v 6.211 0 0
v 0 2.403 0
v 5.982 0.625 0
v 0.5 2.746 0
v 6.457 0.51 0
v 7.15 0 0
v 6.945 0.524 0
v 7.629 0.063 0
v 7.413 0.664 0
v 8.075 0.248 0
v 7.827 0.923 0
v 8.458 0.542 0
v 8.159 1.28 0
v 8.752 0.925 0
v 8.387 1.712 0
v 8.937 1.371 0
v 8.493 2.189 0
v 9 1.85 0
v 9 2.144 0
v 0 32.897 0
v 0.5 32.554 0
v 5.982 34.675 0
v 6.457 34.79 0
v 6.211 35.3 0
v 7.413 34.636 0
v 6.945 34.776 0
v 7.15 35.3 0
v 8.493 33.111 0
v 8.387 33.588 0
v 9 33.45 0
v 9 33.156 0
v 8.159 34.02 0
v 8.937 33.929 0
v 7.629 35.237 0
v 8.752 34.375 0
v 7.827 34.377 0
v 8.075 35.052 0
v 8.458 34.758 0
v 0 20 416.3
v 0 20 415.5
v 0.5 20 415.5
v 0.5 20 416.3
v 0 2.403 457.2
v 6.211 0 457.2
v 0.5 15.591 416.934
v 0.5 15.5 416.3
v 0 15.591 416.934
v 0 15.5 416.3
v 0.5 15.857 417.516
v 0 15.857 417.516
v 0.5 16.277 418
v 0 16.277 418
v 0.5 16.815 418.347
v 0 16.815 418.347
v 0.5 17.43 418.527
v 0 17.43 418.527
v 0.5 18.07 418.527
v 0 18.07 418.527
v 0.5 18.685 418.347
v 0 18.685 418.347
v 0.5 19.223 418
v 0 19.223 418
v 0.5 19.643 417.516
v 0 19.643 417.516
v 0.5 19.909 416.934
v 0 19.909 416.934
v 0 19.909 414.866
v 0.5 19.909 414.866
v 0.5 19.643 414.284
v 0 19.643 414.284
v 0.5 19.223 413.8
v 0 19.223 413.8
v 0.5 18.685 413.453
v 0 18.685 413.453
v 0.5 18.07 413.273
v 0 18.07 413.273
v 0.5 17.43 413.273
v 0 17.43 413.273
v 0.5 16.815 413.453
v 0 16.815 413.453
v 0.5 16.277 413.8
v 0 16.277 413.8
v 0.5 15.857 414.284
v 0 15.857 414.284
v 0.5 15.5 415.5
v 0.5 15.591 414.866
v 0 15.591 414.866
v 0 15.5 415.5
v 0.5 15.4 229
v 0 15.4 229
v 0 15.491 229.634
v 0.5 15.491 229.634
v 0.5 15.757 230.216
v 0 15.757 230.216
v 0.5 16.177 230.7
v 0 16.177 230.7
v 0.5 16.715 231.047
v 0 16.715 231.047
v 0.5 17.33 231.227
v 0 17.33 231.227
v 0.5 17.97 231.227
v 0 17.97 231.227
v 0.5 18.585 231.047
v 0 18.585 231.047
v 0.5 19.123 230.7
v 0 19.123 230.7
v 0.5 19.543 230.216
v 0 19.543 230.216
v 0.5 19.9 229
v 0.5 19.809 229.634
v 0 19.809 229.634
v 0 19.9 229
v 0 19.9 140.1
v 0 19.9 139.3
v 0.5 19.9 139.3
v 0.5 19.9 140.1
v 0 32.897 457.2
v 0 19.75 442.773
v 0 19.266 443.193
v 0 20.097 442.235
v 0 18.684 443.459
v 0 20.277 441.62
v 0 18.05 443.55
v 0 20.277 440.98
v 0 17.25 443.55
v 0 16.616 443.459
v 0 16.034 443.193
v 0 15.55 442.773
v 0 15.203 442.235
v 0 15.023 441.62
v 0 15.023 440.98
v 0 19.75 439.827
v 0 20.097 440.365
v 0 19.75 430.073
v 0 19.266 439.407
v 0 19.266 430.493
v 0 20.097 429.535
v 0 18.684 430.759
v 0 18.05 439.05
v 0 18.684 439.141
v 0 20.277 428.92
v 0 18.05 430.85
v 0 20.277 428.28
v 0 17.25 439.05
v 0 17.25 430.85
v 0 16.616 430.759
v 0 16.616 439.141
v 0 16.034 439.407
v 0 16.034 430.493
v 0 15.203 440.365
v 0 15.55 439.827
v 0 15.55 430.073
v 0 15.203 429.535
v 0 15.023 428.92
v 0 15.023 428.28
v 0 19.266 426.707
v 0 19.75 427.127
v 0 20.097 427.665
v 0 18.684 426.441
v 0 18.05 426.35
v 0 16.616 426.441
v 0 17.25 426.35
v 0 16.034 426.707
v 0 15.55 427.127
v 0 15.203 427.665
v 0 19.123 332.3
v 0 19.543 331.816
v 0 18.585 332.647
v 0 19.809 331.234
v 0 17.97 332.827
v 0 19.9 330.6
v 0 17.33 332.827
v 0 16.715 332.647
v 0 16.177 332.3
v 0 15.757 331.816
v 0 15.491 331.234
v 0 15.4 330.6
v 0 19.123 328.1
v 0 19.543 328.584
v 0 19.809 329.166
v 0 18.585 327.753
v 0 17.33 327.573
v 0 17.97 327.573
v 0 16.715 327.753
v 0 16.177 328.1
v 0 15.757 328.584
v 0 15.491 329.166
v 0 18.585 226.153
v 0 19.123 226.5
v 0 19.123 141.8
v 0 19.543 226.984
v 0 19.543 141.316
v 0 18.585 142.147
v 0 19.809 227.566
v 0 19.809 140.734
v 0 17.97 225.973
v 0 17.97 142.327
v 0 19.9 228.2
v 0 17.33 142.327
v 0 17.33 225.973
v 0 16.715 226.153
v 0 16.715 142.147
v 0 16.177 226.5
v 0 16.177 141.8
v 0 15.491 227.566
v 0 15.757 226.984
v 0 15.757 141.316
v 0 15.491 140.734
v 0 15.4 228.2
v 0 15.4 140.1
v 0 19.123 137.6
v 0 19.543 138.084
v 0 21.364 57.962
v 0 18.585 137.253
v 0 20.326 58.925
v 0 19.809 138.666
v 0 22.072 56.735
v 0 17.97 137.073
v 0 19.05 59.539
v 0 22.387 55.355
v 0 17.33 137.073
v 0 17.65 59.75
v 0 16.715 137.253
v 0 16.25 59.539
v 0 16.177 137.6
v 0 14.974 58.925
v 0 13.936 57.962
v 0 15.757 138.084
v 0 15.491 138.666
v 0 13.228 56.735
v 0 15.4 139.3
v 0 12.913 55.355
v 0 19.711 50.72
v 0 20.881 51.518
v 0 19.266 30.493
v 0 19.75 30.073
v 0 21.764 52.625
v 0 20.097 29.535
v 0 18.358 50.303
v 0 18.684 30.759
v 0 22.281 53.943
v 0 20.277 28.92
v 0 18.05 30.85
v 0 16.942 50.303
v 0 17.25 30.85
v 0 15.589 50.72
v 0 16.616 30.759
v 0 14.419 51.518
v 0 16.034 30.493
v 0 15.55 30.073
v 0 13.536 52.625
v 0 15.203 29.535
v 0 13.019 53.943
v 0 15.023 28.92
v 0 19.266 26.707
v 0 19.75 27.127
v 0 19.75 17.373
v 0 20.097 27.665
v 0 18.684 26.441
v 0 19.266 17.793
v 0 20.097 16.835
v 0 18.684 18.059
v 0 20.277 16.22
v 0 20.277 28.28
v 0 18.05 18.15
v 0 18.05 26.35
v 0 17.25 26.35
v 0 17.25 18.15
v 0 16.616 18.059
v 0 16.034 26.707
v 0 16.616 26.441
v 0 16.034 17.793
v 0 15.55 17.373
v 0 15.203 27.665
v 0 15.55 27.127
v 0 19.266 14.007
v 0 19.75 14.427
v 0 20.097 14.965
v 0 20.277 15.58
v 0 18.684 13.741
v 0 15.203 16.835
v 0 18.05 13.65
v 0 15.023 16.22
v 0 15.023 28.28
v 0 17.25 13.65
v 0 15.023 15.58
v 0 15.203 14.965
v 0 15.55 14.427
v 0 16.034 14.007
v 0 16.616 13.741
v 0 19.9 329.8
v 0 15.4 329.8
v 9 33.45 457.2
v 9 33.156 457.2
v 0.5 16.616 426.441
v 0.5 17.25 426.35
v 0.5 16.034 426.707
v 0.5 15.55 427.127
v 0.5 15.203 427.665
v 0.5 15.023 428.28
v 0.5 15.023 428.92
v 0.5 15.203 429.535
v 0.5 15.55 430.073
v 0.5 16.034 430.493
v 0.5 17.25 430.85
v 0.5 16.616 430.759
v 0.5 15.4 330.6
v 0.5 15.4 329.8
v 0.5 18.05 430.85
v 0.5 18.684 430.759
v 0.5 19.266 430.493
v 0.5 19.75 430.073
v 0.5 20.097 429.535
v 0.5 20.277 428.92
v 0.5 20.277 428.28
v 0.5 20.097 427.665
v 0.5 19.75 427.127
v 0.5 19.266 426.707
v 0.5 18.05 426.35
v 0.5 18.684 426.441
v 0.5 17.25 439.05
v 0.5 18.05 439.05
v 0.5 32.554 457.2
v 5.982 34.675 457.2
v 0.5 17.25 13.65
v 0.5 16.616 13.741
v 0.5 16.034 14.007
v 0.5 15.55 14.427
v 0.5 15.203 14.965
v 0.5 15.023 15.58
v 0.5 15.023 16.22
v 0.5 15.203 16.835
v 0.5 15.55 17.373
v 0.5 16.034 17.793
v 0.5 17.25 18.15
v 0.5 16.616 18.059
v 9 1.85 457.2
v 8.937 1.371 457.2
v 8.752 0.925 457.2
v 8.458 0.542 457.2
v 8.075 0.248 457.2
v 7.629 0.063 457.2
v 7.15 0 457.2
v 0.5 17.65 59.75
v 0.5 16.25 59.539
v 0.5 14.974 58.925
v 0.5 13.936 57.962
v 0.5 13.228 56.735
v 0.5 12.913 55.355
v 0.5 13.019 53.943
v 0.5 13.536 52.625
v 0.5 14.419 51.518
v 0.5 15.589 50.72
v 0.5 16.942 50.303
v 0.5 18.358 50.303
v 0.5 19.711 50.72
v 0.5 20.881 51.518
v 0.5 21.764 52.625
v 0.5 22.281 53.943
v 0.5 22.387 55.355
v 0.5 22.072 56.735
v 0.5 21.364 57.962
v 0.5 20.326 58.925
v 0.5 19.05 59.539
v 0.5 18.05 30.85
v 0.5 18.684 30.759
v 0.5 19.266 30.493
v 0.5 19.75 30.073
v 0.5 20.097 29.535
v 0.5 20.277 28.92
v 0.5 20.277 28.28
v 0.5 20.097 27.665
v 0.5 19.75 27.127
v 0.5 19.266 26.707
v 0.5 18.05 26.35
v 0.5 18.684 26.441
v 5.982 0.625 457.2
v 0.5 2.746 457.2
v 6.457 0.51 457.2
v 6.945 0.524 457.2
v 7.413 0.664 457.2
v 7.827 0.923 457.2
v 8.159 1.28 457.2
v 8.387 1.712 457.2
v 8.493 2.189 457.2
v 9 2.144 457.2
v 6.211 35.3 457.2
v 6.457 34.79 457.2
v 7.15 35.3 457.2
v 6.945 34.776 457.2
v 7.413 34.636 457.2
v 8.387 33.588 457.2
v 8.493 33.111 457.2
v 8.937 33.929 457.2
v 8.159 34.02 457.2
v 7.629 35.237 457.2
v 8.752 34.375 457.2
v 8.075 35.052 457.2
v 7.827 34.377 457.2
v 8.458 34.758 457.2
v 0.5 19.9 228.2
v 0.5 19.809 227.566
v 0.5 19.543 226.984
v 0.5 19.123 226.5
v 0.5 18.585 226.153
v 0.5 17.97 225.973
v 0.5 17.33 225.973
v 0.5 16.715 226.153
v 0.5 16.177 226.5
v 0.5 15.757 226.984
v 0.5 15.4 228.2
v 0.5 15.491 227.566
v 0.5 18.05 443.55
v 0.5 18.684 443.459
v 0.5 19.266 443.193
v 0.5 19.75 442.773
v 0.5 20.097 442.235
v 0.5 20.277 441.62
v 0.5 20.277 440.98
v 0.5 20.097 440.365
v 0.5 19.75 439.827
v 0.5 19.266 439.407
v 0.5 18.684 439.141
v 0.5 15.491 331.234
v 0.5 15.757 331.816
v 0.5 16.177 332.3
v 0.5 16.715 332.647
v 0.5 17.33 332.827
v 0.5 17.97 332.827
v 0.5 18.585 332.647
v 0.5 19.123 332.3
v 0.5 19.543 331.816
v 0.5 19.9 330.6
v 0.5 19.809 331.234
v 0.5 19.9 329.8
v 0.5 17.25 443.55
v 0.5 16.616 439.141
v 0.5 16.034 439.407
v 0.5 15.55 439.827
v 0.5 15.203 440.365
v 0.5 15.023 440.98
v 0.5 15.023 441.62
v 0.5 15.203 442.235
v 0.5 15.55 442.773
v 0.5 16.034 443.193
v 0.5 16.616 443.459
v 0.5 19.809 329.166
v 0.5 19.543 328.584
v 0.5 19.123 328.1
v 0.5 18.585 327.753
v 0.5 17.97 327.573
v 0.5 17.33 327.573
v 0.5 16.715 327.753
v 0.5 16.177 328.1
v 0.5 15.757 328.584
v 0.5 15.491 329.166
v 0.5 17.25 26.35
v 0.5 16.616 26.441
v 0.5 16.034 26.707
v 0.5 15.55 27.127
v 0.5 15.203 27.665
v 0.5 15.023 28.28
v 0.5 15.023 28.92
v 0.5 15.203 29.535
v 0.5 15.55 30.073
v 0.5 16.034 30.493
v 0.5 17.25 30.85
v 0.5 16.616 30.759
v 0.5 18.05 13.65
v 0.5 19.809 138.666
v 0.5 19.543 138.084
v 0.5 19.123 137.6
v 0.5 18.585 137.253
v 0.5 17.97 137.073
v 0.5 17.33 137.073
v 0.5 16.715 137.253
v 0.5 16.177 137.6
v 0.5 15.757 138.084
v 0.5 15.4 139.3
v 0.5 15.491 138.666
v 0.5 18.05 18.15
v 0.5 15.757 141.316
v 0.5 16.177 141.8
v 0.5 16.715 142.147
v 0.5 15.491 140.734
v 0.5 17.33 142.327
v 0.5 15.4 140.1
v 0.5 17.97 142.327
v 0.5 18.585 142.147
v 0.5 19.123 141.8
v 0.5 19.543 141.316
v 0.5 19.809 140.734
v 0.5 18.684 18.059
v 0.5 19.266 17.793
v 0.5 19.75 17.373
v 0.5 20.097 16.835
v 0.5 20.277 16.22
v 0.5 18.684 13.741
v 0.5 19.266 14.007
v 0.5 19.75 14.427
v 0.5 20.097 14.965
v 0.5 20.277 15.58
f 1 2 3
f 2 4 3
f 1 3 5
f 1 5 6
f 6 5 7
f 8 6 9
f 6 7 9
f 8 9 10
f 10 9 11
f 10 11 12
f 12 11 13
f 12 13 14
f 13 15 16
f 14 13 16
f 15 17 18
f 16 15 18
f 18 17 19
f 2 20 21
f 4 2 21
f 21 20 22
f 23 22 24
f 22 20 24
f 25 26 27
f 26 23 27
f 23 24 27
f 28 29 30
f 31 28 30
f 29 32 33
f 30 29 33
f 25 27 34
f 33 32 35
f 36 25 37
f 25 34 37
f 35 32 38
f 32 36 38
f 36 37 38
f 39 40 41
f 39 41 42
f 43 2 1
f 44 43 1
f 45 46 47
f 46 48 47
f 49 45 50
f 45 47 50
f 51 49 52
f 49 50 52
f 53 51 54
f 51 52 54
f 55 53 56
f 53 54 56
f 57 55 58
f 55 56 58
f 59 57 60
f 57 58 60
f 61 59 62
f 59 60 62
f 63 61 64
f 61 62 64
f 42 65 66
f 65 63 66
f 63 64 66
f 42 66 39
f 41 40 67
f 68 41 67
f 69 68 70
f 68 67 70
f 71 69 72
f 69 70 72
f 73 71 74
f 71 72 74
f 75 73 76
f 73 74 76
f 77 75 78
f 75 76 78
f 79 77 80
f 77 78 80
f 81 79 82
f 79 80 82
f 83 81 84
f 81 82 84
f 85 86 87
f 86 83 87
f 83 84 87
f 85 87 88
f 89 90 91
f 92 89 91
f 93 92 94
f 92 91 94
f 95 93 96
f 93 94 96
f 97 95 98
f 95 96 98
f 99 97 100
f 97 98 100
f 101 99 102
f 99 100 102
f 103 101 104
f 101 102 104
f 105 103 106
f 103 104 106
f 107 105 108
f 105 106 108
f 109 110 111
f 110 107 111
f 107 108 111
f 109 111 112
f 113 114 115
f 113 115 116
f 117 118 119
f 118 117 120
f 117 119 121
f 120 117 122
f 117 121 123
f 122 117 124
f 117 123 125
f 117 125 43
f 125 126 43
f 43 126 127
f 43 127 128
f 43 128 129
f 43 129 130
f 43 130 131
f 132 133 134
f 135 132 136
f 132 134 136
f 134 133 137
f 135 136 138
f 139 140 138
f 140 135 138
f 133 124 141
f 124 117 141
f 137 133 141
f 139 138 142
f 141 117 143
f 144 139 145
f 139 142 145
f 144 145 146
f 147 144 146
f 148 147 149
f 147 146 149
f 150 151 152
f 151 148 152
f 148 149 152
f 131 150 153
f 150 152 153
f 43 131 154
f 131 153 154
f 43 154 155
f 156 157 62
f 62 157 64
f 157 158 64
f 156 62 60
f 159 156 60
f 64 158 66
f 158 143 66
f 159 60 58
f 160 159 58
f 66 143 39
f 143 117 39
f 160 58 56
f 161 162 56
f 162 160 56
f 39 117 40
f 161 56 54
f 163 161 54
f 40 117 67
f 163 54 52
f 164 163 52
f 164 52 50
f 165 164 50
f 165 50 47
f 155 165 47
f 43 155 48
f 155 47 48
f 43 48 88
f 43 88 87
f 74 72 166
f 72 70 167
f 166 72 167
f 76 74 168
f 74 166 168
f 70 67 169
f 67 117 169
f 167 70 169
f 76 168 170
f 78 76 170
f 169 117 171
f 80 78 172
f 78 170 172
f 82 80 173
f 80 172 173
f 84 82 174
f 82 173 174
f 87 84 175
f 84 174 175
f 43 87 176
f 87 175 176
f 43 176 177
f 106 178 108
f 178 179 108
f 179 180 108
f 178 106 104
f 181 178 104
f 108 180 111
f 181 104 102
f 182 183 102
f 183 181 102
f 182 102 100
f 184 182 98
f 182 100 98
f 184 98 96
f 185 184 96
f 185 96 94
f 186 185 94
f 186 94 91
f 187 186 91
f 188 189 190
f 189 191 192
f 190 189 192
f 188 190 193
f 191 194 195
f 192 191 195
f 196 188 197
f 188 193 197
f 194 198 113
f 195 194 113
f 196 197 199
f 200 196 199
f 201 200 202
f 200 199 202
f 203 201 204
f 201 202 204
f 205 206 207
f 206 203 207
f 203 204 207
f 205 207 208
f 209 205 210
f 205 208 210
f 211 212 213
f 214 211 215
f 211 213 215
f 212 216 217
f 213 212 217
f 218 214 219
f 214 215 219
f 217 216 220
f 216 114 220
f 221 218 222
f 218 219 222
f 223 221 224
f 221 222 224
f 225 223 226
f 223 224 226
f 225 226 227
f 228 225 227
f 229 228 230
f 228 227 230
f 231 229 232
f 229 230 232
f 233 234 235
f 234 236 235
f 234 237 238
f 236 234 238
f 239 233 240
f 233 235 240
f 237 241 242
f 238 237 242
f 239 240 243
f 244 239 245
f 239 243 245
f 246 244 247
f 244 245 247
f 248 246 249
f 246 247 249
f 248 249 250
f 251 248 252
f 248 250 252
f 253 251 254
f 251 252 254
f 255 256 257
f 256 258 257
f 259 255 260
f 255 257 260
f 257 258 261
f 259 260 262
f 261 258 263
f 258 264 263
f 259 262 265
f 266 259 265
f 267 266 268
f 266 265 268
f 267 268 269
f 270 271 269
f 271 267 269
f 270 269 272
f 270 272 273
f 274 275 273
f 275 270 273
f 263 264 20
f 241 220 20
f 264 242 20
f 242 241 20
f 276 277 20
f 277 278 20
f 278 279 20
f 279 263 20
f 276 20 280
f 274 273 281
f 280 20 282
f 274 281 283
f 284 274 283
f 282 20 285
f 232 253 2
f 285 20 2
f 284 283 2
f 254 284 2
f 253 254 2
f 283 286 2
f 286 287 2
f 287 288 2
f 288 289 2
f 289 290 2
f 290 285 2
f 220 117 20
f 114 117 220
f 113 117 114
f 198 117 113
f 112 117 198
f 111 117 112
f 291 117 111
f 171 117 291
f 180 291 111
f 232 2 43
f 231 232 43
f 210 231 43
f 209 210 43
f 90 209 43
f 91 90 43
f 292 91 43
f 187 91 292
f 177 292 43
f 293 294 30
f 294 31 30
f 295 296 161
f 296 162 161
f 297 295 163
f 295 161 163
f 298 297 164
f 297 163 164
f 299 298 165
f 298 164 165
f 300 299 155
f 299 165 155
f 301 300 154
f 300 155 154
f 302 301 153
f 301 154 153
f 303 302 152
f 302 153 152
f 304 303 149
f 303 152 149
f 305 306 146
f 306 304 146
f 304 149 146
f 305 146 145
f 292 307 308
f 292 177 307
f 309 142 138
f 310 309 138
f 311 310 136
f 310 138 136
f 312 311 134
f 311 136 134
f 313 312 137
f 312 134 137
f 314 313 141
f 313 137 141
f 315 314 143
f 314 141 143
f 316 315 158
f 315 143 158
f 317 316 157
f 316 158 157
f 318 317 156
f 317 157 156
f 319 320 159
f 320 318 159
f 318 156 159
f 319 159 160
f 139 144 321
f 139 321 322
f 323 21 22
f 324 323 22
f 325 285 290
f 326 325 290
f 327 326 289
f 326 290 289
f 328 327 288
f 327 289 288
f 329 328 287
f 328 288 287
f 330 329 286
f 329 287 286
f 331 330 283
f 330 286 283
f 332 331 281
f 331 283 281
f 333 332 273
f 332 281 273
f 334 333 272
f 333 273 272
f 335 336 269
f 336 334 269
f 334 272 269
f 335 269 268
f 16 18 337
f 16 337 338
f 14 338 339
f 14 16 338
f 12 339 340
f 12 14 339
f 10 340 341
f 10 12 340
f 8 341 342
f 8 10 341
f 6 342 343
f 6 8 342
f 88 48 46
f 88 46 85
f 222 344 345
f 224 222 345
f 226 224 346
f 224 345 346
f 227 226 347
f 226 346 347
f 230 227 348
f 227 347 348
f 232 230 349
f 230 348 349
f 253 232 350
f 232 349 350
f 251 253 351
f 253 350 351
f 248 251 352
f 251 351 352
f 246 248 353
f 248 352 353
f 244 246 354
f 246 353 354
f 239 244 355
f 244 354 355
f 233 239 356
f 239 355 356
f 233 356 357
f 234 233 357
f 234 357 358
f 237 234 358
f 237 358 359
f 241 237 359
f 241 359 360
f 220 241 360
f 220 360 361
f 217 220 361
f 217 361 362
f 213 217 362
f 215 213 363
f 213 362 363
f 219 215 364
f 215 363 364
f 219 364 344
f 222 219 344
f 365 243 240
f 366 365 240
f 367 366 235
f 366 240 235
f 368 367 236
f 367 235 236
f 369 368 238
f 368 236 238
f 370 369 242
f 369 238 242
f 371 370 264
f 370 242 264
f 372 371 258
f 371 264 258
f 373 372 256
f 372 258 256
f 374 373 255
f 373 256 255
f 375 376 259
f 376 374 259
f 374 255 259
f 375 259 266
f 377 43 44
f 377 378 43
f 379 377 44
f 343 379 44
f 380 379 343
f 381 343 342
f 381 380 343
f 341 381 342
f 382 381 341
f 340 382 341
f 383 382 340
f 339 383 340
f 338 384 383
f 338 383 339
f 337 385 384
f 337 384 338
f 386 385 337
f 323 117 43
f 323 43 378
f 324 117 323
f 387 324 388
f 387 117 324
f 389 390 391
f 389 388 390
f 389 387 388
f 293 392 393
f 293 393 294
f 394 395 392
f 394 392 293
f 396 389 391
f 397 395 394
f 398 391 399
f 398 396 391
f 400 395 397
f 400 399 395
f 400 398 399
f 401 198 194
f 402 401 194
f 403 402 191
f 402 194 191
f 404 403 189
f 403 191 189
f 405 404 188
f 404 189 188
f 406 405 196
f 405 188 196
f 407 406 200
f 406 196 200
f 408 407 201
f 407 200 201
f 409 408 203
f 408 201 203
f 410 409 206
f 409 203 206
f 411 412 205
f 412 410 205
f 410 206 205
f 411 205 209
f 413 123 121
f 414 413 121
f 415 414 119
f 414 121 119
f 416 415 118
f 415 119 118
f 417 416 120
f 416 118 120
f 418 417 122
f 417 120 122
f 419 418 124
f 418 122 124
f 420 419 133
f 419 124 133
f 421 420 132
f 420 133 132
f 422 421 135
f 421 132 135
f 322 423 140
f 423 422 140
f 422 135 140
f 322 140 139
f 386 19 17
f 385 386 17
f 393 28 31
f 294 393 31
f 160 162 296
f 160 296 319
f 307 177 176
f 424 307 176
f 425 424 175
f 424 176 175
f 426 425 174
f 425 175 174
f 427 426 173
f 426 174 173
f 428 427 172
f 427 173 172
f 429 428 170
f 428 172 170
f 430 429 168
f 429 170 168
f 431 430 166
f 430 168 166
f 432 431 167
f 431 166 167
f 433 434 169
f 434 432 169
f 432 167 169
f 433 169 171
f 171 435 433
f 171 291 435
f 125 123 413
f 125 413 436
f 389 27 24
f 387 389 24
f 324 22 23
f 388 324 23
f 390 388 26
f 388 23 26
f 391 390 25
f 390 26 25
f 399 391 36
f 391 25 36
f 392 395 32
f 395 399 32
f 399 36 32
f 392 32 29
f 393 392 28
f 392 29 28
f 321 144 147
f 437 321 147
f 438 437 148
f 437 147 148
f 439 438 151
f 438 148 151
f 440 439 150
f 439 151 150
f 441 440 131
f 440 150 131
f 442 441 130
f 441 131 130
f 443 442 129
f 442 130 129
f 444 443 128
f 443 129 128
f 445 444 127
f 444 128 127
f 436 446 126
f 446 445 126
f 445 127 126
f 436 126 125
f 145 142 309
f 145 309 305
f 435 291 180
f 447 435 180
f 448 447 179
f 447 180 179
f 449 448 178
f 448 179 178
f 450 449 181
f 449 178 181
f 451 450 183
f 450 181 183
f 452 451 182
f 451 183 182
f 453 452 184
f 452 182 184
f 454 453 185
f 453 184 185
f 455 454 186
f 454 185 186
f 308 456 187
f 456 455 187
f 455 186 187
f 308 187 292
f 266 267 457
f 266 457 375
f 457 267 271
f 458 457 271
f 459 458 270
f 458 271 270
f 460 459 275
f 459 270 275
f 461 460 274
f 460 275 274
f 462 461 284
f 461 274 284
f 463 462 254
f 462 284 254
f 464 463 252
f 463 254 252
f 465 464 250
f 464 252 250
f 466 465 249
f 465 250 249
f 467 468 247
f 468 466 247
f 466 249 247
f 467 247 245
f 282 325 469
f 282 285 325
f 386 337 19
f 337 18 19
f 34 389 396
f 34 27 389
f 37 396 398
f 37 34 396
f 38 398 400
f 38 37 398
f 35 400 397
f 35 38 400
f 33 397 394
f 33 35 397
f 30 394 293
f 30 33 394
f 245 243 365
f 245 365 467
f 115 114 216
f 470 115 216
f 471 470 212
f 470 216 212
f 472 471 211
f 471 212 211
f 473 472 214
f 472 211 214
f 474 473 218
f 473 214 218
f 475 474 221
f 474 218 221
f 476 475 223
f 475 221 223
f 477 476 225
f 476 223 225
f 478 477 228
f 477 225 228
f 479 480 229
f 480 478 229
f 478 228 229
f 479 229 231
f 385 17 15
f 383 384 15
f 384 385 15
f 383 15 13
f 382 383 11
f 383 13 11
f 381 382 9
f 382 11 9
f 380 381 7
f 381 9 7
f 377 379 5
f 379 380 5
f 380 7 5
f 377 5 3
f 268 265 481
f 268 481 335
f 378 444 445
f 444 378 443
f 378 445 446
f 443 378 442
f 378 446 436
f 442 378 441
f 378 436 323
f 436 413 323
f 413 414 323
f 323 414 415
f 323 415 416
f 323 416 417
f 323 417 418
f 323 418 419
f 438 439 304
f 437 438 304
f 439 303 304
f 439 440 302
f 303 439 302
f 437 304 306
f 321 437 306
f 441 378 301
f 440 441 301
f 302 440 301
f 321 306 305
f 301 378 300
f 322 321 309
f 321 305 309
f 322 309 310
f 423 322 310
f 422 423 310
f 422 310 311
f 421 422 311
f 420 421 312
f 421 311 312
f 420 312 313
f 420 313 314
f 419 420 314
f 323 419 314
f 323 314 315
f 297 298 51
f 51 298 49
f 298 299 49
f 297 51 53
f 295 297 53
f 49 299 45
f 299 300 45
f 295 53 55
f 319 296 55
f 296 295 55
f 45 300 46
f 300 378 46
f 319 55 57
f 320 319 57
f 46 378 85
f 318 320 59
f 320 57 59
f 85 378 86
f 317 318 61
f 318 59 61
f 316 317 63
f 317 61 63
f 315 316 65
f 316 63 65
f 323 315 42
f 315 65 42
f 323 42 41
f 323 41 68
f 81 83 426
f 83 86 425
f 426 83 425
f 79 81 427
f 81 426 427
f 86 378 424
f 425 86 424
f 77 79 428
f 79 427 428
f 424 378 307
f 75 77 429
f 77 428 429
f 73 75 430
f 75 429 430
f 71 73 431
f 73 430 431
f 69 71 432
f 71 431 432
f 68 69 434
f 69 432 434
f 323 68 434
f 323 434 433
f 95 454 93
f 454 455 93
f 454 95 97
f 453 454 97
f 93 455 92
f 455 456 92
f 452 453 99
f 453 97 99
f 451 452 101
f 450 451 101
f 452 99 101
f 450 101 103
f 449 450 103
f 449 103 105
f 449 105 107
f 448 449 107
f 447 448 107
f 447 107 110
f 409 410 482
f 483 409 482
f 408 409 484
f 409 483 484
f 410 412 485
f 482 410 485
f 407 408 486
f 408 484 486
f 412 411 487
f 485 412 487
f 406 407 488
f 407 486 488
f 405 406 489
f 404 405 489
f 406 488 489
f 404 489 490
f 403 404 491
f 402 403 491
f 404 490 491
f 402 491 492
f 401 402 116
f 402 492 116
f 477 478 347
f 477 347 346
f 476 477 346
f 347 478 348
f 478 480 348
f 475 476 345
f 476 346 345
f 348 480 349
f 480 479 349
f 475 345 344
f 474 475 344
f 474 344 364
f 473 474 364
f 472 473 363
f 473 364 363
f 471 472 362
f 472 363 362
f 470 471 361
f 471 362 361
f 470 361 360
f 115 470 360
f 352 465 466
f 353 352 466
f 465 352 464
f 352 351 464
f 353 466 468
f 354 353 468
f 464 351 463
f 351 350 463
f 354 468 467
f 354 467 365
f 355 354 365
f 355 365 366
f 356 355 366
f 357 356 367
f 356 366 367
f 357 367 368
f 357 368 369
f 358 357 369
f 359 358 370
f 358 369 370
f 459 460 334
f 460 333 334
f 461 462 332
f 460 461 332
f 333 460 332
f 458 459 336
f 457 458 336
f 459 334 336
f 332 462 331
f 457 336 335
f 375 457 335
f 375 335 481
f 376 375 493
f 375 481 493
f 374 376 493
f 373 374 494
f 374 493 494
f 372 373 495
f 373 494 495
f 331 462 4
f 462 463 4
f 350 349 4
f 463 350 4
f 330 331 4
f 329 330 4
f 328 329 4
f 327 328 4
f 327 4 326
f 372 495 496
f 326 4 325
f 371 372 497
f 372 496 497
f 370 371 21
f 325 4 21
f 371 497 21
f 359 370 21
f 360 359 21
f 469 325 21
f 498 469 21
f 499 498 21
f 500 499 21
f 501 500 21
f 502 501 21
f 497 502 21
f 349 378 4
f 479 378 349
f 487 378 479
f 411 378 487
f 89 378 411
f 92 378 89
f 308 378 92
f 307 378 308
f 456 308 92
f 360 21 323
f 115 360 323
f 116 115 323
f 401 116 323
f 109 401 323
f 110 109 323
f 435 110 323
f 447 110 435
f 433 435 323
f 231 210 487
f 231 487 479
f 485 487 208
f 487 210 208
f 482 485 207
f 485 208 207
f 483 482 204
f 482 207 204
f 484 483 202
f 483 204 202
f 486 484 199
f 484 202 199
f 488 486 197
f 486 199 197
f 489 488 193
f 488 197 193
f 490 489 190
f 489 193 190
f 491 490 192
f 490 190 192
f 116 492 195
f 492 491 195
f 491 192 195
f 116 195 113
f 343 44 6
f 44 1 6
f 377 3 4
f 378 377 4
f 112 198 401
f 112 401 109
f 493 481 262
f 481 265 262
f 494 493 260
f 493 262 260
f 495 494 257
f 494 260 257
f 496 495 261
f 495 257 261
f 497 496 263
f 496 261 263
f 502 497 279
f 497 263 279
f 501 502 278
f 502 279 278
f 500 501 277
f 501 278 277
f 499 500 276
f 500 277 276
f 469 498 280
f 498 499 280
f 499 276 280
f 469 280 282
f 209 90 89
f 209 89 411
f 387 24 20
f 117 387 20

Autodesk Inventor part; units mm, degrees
sketch "Sketch_1" plane through (0, 0, 0) normal (0, 0, 1) x (1, 0, 0)
  line L0 (0, 32.8967) -> (0, 2.4033)
  line L1 (0, 2.4033) -> (6.2112, 0)
  line L2 (6.2112, 0) -> (7.15, 0)
  arc A0 (7.15, 0) -> (9, 1.85) centre (7.15, 1.85) ccw
  line L3 (9, 1.85) -> (9, 2.1444)
  line L4 (9, 2.1444) -> (8.493, 2.1888)
  arc A1 (5.9824, 0.6246) -> (8.493, 2.1888) centre (6.65, 2.35) ccw
  line L5 (5.9824, 0.6246) -> (0.5, 2.7459)
  line L6 (0.5, 2.7459) -> (0.5, 32.5541)
  line L7 (0.5, 32.5541) -> (5.9824, 34.6754)
  arc A2 (8.493, 33.1112) -> (5.9824, 34.6754) centre (6.65, 32.95) ccw
  line L8 (8.493, 33.1112) -> (9, 33.1556)
  line L9 (9, 33.1556) -> (9, 33.45)
  arc A3 (9, 33.45) -> (7.15, 35.3) centre (7.15, 33.45) ccw
  line L10 (7.15, 35.3) -> (6.2112, 35.3)
  line L11 (6.2112, 35.3) -> (0, 32.8967)
extrude "Extrusion1" add sketch "Sketch_1" along normal blind 457.2
sketch "Sketch_4" plane through (0, 0, 0) normal (1, 0, 0) x (0, 1, 0)
  arc A0 (17.65, 332.85) -> (15.4, 330.6) centre (17.65, 330.6) ccw
  line L0 (15.4, 330.6) -> (15.4, 329.8)
  arc A1 (15.4, 329.8) -> (17.65, 327.55) centre (17.65, 329.8) ccw
  arc A2 (17.65, 327.55) -> (19.9, 329.8) centre (17.65, 329.8) ccw
  line L1 (19.9, 329.8) -> (19.9, 330.6)
  arc A3 (19.9, 330.6) -> (17.65, 332.85) centre (17.65, 330.6) ccw
extrude "Extrusion2" cut sketch "Sketch_4" along normal blind 0.5
sketch "Sketch_5" plane through (0, 0, 0) normal (1, 0, 0) x (0, 1, 0)
  arc A0 (17.65, 231.25) -> (15.4, 229) centre (17.65, 229) ccw
  line L0 (15.4, 229) -> (15.4, 228.2)
  arc A1 (15.4, 228.2) -> (17.65, 225.95) centre (17.65, 228.2) ccw
  arc A2 (17.65, 225.95) -> (19.9, 228.2) centre (17.65, 228.2) ccw
  line L1 (19.9, 228.2) -> (19.9, 229)
  arc A3 (19.9, 229) -> (17.65, 231.25) centre (17.65, 229) ccw
extrude "Extrusion3" cut sketch "Sketch_5" along normal blind 0.5
sketch "Sketch_6" plane through (0, 0, 0) normal (1, 0, 0) x (0, 1, 0)
  arc A0 (17.65, 142.35) -> (15.4, 140.1) centre (17.65, 140.1) ccw
  line L0 (15.4, 140.1) -> (15.4, 139.3)
  arc A1 (15.4, 139.3) -> (17.65, 137.05) centre (17.65, 139.3) ccw
  arc A2 (17.65, 137.05) -> (19.9, 139.3) centre (17.65, 139.3) ccw
  line L1 (19.9, 139.3) -> (19.9, 140.1)
  arc A3 (19.9, 140.1) -> (17.65, 142.35) centre (17.65, 140.1) ccw
extrude "Extrusion4" cut sketch "Sketch_6" along normal blind 0.5
sketch "Sketch_7" plane through (0, 0, 0) normal (1, 0, 0) x (0, 1, 0)
  line L0 (18.05, 443.55) -> (17.25, 443.55)
  arc A0 (17.25, 443.55) -> (15, 441.3) centre (17.25, 441.3) ccw
  arc A1 (15, 441.3) -> (17.25, 439.05) centre (17.25, 441.3) ccw
  line L1 (17.25, 439.05) -> (18.05, 439.05)
  arc A2 (18.05, 439.05) -> (20.3, 441.3) centre (18.05, 441.3) ccw
  arc A3 (20.3, 441.3) -> (18.05, 443.55) centre (18.05, 441.3) ccw
extrude "Extrusion5" cut sketch "Sketch_7" along normal blind 0.5
sketch "Sketch_3" plane through (0, 0, 0) normal (1, 0, 0) x (0, 1, 0)
  line L0 (18.05, 30.85) -> (17.25, 30.85)
  arc A0 (17.25, 30.85) -> (15, 28.6) centre (17.25, 28.6) ccw
  arc A1 (15, 28.6) -> (17.25, 26.35) centre (17.25, 28.6) ccw
  line L1 (17.25, 26.35) -> (18.05, 26.35)
  arc A2 (18.05, 26.35) -> (20.3, 28.6) centre (18.05, 28.6) ccw
  arc A3 (20.3, 28.6) -> (18.05, 30.85) centre (18.05, 28.6) ccw
extrude "Extrusion6" cut sketch "Sketch_3" along normal blind 0.5
sketch "Sketch_8" plane through (0, 0, 0) normal (1, 0, 0) x (0, 1, 0)
  line L0 (18.05, 18.15) -> (17.25, 18.15)
  arc A0 (17.25, 18.15) -> (15, 15.9) centre (17.25, 15.9) ccw
  arc A1 (15, 15.9) -> (17.25, 13.65) centre (17.25, 15.9) ccw
  line L1 (17.25, 13.65) -> (18.05, 13.65)
  arc A2 (18.05, 13.65) -> (20.3, 15.9) centre (18.05, 15.9) ccw
  arc A3 (20.3, 15.9) -> (18.05, 18.15) centre (18.05, 15.9) ccw
extrude "Extrusion7" cut sketch "Sketch_8" along normal blind 0.5
sketch "Sketch_9" plane through (0, 0, 0) normal (1, 0, 0) x (0, 1, 0)
  line L0 (18.05, 430.85) -> (17.25, 430.85)
  arc A0 (17.25, 430.85) -> (15, 428.6) centre (17.25, 428.6) ccw
  arc A1 (15, 428.6) -> (17.25, 426.35) centre (17.25, 428.6) ccw
  line L1 (17.25, 426.35) -> (18.05, 426.35)
  arc A2 (18.05, 426.35) -> (20.3, 428.6) centre (18.05, 428.6) ccw
  arc A3 (20.3, 428.6) -> (18.05, 430.85) centre (18.05, 428.6) ccw
extrude "Extrusion8" cut sketch "Sketch_9" along normal blind 0.5
sketch "Sketch_10" plane through (0, 0, 0) normal (1, 0, 0) x (0, 1, 0)
  arc A0 (17.75, 418.55) -> (15.5, 416.3) centre (17.75, 416.3) ccw
  line L0 (15.5, 416.3) -> (15.5, 415.5)
  arc A1 (15.5, 415.5) -> (17.75, 413.25) centre (17.75, 415.5) ccw
  arc A2 (17.75, 413.25) -> (20, 415.5) centre (17.75, 415.5) ccw
  line L1 (20, 415.5) -> (20, 416.3)
  arc A3 (20, 416.3) -> (17.75, 418.55) centre (17.75, 416.3) ccw
extrude "Extrusion9" cut sketch "Sketch_10" along normal blind 0.5
sketch "Sketch10" plane through (0, 2.4033, 0) normal (-1, 0, 0) x (0, 0, 1)
  point P0 (55, 15.2467)
hole "Hole1" at (0, 17.65, 55) direction (1, 0, 0) diameter 9.5 depth 0.5
ref_plane "to_rail_XY" through (9.5, 17.65, 228.6) normal (0, 0, 1) x (1, 0, 0)
ref_plane "to_rail_YZ" through (9.5, 17.65, 228.6) normal (1, 0, 0) x (0, 1, 0)
ref_plane "to_rail_ZX" through (9.5, 17.65, 228.6) normal (0, 1, 0) x (0, 0, 1)
properties part number "body_SSRN3618" material "鉄 灰色"
